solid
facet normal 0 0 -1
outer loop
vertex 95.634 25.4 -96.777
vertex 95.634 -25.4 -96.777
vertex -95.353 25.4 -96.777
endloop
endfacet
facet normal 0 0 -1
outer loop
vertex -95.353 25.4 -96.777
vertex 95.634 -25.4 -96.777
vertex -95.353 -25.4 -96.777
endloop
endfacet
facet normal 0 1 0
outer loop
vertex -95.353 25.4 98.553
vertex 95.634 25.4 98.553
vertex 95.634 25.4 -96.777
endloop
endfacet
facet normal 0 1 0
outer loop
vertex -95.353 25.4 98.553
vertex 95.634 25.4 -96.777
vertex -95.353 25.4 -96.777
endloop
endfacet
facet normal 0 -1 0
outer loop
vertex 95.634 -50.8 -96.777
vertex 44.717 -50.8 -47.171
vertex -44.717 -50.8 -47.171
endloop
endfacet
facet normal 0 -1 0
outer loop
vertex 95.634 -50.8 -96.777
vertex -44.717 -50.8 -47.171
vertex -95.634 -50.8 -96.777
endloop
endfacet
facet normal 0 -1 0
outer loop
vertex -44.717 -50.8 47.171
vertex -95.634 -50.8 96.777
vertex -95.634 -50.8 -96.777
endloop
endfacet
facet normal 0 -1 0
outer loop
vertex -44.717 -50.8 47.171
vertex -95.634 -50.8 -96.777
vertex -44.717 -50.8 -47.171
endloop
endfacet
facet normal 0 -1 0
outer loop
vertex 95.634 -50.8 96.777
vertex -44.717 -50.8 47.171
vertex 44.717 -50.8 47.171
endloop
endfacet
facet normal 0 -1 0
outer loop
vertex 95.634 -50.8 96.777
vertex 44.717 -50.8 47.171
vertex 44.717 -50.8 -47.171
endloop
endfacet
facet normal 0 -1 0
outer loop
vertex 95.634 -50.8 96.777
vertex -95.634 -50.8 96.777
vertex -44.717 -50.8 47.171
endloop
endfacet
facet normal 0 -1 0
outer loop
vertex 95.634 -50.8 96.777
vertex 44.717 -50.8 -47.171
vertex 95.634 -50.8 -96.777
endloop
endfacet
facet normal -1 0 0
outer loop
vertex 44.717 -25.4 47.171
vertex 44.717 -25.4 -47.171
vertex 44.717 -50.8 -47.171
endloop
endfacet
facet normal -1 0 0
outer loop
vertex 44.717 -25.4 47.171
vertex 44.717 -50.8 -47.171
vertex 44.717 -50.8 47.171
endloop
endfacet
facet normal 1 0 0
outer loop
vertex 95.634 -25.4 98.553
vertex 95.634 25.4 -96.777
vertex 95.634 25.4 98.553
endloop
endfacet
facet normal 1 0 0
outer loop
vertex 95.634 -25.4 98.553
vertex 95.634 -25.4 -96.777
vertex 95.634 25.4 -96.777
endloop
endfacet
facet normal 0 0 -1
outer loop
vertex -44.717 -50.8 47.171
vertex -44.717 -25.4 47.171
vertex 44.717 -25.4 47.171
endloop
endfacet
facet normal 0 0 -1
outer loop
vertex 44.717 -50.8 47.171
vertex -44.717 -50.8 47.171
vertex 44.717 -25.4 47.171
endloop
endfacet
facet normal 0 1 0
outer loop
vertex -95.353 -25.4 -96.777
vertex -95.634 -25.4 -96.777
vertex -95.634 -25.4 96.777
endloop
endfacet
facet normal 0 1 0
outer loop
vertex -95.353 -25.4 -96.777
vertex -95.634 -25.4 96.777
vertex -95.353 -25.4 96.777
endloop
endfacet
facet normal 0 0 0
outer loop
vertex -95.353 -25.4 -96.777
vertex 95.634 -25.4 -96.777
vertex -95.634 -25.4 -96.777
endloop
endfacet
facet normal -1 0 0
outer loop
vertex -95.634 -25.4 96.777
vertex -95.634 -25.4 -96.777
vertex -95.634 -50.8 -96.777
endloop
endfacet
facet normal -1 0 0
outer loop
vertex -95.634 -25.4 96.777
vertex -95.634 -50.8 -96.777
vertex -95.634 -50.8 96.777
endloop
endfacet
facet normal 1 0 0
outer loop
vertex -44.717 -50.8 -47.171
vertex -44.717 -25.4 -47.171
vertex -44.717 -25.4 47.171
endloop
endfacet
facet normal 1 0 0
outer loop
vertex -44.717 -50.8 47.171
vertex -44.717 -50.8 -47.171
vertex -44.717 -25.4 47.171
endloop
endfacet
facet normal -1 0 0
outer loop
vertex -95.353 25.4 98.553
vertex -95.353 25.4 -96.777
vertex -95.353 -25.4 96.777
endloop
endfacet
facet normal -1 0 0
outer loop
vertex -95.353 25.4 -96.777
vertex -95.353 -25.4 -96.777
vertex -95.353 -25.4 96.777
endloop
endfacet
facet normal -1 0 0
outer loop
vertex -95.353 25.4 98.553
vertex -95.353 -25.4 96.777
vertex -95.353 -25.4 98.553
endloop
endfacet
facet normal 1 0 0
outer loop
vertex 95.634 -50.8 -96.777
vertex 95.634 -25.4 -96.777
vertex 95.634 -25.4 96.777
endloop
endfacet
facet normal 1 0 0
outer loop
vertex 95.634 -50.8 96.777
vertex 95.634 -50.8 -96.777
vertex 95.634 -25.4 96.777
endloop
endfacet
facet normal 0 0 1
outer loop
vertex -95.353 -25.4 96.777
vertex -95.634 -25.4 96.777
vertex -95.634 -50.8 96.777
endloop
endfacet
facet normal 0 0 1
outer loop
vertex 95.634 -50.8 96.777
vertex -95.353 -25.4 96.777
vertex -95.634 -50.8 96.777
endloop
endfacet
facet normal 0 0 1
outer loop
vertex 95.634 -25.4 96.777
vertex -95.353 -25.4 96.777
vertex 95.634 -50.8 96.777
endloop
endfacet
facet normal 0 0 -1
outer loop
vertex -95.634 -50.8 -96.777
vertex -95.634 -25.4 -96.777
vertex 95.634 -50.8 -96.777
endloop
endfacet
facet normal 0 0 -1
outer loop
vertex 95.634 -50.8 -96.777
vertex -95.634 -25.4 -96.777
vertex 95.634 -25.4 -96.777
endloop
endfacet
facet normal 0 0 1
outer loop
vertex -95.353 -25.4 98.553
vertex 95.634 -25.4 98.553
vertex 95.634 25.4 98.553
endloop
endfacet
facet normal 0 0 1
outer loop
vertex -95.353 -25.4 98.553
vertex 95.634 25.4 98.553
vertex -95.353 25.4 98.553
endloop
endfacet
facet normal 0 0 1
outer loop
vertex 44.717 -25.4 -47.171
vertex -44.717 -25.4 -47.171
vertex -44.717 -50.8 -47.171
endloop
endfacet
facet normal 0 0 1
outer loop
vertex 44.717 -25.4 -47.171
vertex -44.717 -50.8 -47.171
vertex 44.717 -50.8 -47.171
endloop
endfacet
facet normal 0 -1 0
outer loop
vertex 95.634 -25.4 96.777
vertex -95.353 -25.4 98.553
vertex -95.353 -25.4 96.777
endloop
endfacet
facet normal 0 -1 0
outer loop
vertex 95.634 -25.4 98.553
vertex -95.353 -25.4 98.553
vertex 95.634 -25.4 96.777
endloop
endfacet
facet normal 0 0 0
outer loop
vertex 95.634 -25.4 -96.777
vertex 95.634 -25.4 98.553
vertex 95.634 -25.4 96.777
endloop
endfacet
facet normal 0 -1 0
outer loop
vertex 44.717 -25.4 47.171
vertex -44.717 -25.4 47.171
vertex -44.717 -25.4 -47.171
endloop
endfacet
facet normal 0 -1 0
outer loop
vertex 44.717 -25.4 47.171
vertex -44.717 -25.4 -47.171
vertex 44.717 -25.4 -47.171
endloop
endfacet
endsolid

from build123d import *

# Parameters (mm, degrees)
F0_W     = 190.987497
F0_H     = 195.329547
F1_DEPTH = 25.4
F2_W     = 190.987497
F2_H     = 195.329547
F2_W_2   = 92.081398
F2_H_2   = 90.176002
F3_DEPTH = 25.4
F4_W     = 191.268652
F4_H     = 193.553298
F4_W_2   = 89.433506
F4_H_2   = 94.341778
F5_DEPTH = 25.4
F6_W     = 92.081398
F6_H     = 90.176002
F7_DEPTH = 25.4


with BuildPart() as f1:
    # F0 (on Front) → F1 (new body)
    with BuildSketch(Plane.XZ):
        with Locations((0.140578, 0.888125)):
            Rectangle(F0_W, F0_H)
    extrude(amount=F1_DEPTH)

    # F2 (on face) → F3 (join)
    with BuildSketch(Plane(origin=(0, 0, 0), x_dir=(-1, 0, 0), z_dir=(0, 1, 0))):
        with Locations((-0.140578, 0.888125)):
            Rectangle(F2_W, F2_H)
        Rectangle(F2_W_2, F2_H_2, mode=Mode.SUBTRACT)
    extrude(amount=F3_DEPTH)

    # F4 (on face) → F5 (join)
    with BuildSketch(Plane.XZ.offset(25.4)):
        Rectangle(F4_W, F4_H)
        Rectangle(F4_W_2, F4_H_2, mode=Mode.SUBTRACT)
    extrude(amount=F5_DEPTH)

    # F6 (on face) → F7 (join)
    with BuildSketch(Plane(origin=(0, 0, 0), x_dir=(-1, 0, 0), z_dir=(0, 1, 0))):
        Rectangle(F6_W, F6_H)
    extrude(amount=F7_DEPTH)


solid = f1.part
